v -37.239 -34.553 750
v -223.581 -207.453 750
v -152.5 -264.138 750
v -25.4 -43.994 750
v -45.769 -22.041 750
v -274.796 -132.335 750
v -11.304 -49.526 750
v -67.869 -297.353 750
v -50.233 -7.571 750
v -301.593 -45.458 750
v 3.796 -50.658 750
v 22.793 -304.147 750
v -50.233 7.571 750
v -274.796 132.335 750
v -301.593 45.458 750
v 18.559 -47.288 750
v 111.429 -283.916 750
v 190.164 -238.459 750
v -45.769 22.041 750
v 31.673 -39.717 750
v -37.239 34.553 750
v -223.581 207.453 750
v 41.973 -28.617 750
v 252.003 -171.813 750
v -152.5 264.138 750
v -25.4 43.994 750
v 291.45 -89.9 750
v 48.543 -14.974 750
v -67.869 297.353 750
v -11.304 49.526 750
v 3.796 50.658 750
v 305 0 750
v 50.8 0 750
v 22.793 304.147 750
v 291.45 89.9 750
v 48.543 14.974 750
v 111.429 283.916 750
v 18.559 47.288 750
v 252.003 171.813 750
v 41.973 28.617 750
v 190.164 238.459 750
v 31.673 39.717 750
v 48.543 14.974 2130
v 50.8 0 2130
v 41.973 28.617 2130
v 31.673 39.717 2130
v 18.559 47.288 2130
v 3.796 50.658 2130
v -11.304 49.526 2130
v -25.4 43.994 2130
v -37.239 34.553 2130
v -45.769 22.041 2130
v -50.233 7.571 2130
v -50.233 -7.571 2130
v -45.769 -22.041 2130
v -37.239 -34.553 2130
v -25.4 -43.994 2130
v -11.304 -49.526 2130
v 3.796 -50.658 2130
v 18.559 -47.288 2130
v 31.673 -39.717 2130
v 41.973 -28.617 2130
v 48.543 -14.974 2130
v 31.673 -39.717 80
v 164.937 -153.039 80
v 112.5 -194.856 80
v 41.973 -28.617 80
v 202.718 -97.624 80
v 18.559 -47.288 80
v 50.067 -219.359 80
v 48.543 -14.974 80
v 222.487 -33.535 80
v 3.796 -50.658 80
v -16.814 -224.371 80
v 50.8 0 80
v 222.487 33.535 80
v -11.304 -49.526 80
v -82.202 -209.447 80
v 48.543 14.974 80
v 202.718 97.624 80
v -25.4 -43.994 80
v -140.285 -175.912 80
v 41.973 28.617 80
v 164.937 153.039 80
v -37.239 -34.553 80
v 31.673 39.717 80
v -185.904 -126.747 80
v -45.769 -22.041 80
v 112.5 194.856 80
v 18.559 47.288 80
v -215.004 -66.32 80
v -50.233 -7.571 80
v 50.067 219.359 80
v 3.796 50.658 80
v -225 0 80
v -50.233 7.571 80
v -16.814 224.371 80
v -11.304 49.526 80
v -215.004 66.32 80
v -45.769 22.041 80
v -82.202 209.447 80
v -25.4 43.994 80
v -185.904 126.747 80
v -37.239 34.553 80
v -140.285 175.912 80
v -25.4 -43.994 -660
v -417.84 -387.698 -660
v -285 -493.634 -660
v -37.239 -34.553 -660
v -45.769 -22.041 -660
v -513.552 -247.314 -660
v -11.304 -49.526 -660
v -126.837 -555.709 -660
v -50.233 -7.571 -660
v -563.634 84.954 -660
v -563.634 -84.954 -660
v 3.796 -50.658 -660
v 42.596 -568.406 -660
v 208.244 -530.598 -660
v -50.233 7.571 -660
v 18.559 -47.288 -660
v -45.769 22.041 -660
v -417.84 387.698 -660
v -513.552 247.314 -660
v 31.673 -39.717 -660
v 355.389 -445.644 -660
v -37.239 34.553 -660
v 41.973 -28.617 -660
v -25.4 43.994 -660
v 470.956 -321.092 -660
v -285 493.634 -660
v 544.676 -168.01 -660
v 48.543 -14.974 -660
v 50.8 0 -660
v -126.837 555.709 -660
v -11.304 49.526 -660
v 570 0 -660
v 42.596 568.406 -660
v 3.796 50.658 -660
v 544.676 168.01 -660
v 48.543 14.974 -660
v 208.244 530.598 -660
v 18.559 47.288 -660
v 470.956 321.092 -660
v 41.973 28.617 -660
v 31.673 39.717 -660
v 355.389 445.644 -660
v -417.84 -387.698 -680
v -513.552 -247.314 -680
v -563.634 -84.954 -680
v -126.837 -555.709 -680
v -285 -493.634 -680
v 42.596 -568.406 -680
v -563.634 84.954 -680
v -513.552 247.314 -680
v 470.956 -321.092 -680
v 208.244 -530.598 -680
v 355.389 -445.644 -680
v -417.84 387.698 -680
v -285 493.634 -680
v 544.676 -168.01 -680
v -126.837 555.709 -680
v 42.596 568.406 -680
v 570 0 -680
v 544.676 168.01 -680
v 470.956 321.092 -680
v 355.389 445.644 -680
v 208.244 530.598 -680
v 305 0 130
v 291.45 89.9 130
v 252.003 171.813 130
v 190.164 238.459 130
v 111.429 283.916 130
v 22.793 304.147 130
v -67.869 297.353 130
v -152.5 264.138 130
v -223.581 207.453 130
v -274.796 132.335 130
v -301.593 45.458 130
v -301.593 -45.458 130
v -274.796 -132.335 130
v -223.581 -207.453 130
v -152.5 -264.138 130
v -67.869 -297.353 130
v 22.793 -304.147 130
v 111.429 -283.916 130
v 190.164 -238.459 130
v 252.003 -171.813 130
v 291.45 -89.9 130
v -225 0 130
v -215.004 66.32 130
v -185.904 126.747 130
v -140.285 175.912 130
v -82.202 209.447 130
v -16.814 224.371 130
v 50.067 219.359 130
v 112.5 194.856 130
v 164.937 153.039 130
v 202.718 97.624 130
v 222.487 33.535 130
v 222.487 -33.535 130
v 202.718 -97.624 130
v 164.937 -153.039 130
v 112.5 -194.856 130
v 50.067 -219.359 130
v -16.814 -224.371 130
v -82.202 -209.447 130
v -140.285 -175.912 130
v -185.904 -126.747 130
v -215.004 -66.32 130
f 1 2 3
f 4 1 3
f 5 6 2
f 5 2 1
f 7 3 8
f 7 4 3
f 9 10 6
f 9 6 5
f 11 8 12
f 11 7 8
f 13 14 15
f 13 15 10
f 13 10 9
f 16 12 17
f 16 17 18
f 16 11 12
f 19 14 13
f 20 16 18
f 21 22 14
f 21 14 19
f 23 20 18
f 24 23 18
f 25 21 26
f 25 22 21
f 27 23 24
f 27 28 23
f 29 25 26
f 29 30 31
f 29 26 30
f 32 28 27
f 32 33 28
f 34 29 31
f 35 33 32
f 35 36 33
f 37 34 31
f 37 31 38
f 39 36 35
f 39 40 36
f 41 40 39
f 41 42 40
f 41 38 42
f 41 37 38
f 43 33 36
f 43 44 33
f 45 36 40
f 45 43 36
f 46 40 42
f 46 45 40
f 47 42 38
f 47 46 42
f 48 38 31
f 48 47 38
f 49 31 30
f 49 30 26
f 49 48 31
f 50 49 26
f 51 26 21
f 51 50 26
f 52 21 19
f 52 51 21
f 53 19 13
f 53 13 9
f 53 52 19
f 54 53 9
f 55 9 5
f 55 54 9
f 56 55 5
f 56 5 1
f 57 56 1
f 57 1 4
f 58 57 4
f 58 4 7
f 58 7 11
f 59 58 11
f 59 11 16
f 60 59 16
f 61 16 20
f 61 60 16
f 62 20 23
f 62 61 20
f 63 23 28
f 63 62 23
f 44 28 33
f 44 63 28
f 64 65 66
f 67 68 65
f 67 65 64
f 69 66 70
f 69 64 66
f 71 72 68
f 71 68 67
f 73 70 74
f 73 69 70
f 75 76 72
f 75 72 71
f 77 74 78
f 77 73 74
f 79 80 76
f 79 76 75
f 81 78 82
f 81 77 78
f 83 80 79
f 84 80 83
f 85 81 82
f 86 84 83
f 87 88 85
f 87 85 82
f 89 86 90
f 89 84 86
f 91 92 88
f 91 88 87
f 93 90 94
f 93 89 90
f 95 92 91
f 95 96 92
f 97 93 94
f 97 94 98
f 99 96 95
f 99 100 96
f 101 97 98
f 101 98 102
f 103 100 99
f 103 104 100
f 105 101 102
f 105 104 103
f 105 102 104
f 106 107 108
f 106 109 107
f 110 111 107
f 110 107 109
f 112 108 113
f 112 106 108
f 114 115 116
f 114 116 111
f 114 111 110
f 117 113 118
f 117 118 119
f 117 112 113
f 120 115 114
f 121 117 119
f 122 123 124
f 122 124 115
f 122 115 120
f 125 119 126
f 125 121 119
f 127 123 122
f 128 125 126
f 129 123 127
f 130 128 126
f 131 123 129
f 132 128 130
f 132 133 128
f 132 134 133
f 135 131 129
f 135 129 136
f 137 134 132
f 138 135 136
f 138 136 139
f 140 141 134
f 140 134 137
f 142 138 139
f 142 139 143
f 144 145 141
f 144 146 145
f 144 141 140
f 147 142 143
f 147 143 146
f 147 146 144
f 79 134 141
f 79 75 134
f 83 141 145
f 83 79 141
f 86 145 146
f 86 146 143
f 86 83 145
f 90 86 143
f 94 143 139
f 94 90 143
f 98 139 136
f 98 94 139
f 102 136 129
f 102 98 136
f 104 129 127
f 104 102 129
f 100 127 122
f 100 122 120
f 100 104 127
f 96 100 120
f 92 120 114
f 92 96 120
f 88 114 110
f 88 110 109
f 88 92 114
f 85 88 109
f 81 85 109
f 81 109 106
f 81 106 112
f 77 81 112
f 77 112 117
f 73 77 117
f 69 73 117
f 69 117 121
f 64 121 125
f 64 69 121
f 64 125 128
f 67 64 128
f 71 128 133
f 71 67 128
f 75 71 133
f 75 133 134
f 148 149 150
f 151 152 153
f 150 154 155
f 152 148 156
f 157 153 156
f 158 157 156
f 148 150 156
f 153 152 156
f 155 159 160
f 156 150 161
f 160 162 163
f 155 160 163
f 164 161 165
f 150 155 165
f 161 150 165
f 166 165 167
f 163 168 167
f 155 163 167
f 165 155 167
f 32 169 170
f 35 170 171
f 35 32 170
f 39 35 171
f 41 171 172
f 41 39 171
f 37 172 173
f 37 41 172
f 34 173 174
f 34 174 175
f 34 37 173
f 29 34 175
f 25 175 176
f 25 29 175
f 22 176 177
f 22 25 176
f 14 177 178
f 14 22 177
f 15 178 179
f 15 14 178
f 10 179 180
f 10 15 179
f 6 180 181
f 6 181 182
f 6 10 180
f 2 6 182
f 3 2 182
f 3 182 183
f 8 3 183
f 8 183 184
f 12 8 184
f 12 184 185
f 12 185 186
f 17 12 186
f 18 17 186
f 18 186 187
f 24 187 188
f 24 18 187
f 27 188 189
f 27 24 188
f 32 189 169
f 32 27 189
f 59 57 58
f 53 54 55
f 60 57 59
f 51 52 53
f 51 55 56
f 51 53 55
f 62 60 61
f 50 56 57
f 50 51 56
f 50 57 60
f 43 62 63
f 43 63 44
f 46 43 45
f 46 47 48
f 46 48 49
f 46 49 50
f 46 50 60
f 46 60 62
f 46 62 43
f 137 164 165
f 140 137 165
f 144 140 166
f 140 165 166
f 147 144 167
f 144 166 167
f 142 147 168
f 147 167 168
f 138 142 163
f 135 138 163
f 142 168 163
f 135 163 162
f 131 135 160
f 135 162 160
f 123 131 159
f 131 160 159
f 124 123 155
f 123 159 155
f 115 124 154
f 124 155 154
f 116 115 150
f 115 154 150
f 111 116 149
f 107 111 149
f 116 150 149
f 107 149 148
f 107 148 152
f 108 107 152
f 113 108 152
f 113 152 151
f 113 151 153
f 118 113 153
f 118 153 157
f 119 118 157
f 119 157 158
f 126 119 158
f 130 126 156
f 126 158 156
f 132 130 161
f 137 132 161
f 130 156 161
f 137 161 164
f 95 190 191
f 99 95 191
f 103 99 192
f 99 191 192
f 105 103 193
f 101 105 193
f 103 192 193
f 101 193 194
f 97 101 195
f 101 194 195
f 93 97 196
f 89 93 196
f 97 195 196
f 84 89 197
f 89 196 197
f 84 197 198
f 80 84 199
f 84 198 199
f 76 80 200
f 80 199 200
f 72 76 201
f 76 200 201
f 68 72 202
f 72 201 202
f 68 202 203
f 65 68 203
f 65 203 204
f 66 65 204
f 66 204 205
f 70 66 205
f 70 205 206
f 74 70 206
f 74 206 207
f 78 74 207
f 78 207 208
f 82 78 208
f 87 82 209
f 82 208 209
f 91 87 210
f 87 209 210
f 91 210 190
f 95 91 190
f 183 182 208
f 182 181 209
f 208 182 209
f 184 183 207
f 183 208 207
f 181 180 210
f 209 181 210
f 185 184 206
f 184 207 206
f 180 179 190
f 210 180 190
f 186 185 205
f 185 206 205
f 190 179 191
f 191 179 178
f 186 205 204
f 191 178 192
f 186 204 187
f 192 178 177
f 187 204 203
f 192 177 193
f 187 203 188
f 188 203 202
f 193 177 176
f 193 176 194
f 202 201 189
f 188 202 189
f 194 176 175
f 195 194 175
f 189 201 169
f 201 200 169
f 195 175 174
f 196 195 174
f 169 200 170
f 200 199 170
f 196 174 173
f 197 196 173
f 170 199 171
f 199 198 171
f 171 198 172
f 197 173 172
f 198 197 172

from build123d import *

# Parameters (mm, degrees)
SKETCH1_R                = 50.8
BOSS_EXTRUDE1_DEPTH      = 2130
BOSS_EXTRUDE1_DEPTH_BACK = 680
SKETCH2_R                = 570
BOSS_EXTRUDE2_DEPTH      = 20
BOSS_EXTRUDE3_START      = -1380
SKETCH7_R                = 305
BOSS_EXTRUDE3_DEPTH      = 620
SKETCH8_R                = 225
BOSS_EXTRUDE4_DEPTH      = 50


with BuildPart() as part:
    # Sketch1 → Boss-Extrude1 (new body, two sides)
    with BuildSketch(Plane.XY) as boss_extrude1_sk:
        Circle(SKETCH1_R)
    extrude(amount=BOSS_EXTRUDE1_DEPTH)
    extrude(boss_extrude1_sk.sketch, amount=-BOSS_EXTRUDE1_DEPTH_BACK)

    # Sketch2 → Boss-Extrude2 (add)
    with BuildSketch(Plane.XY.offset(-680)):
        Circle(SKETCH2_R)
    extrude(amount=BOSS_EXTRUDE2_DEPTH)

    # Sketch7 → Boss-Extrude3 (add)
    with BuildSketch(Plane.XY.offset(2130).offset(BOSS_EXTRUDE3_START)):
        Circle(SKETCH7_R)
    extrude(amount=-BOSS_EXTRUDE3_DEPTH)

    # Sketch8 → Boss-Extrude4 (add)
    with BuildSketch(Plane(origin=(0, 0, 130), x_dir=(-1, 0, 0), z_dir=(0, 0, -1))):
        Circle(SKETCH8_R)
    extrude(amount=BOSS_EXTRUDE4_DEPTH)


solid = part.part
